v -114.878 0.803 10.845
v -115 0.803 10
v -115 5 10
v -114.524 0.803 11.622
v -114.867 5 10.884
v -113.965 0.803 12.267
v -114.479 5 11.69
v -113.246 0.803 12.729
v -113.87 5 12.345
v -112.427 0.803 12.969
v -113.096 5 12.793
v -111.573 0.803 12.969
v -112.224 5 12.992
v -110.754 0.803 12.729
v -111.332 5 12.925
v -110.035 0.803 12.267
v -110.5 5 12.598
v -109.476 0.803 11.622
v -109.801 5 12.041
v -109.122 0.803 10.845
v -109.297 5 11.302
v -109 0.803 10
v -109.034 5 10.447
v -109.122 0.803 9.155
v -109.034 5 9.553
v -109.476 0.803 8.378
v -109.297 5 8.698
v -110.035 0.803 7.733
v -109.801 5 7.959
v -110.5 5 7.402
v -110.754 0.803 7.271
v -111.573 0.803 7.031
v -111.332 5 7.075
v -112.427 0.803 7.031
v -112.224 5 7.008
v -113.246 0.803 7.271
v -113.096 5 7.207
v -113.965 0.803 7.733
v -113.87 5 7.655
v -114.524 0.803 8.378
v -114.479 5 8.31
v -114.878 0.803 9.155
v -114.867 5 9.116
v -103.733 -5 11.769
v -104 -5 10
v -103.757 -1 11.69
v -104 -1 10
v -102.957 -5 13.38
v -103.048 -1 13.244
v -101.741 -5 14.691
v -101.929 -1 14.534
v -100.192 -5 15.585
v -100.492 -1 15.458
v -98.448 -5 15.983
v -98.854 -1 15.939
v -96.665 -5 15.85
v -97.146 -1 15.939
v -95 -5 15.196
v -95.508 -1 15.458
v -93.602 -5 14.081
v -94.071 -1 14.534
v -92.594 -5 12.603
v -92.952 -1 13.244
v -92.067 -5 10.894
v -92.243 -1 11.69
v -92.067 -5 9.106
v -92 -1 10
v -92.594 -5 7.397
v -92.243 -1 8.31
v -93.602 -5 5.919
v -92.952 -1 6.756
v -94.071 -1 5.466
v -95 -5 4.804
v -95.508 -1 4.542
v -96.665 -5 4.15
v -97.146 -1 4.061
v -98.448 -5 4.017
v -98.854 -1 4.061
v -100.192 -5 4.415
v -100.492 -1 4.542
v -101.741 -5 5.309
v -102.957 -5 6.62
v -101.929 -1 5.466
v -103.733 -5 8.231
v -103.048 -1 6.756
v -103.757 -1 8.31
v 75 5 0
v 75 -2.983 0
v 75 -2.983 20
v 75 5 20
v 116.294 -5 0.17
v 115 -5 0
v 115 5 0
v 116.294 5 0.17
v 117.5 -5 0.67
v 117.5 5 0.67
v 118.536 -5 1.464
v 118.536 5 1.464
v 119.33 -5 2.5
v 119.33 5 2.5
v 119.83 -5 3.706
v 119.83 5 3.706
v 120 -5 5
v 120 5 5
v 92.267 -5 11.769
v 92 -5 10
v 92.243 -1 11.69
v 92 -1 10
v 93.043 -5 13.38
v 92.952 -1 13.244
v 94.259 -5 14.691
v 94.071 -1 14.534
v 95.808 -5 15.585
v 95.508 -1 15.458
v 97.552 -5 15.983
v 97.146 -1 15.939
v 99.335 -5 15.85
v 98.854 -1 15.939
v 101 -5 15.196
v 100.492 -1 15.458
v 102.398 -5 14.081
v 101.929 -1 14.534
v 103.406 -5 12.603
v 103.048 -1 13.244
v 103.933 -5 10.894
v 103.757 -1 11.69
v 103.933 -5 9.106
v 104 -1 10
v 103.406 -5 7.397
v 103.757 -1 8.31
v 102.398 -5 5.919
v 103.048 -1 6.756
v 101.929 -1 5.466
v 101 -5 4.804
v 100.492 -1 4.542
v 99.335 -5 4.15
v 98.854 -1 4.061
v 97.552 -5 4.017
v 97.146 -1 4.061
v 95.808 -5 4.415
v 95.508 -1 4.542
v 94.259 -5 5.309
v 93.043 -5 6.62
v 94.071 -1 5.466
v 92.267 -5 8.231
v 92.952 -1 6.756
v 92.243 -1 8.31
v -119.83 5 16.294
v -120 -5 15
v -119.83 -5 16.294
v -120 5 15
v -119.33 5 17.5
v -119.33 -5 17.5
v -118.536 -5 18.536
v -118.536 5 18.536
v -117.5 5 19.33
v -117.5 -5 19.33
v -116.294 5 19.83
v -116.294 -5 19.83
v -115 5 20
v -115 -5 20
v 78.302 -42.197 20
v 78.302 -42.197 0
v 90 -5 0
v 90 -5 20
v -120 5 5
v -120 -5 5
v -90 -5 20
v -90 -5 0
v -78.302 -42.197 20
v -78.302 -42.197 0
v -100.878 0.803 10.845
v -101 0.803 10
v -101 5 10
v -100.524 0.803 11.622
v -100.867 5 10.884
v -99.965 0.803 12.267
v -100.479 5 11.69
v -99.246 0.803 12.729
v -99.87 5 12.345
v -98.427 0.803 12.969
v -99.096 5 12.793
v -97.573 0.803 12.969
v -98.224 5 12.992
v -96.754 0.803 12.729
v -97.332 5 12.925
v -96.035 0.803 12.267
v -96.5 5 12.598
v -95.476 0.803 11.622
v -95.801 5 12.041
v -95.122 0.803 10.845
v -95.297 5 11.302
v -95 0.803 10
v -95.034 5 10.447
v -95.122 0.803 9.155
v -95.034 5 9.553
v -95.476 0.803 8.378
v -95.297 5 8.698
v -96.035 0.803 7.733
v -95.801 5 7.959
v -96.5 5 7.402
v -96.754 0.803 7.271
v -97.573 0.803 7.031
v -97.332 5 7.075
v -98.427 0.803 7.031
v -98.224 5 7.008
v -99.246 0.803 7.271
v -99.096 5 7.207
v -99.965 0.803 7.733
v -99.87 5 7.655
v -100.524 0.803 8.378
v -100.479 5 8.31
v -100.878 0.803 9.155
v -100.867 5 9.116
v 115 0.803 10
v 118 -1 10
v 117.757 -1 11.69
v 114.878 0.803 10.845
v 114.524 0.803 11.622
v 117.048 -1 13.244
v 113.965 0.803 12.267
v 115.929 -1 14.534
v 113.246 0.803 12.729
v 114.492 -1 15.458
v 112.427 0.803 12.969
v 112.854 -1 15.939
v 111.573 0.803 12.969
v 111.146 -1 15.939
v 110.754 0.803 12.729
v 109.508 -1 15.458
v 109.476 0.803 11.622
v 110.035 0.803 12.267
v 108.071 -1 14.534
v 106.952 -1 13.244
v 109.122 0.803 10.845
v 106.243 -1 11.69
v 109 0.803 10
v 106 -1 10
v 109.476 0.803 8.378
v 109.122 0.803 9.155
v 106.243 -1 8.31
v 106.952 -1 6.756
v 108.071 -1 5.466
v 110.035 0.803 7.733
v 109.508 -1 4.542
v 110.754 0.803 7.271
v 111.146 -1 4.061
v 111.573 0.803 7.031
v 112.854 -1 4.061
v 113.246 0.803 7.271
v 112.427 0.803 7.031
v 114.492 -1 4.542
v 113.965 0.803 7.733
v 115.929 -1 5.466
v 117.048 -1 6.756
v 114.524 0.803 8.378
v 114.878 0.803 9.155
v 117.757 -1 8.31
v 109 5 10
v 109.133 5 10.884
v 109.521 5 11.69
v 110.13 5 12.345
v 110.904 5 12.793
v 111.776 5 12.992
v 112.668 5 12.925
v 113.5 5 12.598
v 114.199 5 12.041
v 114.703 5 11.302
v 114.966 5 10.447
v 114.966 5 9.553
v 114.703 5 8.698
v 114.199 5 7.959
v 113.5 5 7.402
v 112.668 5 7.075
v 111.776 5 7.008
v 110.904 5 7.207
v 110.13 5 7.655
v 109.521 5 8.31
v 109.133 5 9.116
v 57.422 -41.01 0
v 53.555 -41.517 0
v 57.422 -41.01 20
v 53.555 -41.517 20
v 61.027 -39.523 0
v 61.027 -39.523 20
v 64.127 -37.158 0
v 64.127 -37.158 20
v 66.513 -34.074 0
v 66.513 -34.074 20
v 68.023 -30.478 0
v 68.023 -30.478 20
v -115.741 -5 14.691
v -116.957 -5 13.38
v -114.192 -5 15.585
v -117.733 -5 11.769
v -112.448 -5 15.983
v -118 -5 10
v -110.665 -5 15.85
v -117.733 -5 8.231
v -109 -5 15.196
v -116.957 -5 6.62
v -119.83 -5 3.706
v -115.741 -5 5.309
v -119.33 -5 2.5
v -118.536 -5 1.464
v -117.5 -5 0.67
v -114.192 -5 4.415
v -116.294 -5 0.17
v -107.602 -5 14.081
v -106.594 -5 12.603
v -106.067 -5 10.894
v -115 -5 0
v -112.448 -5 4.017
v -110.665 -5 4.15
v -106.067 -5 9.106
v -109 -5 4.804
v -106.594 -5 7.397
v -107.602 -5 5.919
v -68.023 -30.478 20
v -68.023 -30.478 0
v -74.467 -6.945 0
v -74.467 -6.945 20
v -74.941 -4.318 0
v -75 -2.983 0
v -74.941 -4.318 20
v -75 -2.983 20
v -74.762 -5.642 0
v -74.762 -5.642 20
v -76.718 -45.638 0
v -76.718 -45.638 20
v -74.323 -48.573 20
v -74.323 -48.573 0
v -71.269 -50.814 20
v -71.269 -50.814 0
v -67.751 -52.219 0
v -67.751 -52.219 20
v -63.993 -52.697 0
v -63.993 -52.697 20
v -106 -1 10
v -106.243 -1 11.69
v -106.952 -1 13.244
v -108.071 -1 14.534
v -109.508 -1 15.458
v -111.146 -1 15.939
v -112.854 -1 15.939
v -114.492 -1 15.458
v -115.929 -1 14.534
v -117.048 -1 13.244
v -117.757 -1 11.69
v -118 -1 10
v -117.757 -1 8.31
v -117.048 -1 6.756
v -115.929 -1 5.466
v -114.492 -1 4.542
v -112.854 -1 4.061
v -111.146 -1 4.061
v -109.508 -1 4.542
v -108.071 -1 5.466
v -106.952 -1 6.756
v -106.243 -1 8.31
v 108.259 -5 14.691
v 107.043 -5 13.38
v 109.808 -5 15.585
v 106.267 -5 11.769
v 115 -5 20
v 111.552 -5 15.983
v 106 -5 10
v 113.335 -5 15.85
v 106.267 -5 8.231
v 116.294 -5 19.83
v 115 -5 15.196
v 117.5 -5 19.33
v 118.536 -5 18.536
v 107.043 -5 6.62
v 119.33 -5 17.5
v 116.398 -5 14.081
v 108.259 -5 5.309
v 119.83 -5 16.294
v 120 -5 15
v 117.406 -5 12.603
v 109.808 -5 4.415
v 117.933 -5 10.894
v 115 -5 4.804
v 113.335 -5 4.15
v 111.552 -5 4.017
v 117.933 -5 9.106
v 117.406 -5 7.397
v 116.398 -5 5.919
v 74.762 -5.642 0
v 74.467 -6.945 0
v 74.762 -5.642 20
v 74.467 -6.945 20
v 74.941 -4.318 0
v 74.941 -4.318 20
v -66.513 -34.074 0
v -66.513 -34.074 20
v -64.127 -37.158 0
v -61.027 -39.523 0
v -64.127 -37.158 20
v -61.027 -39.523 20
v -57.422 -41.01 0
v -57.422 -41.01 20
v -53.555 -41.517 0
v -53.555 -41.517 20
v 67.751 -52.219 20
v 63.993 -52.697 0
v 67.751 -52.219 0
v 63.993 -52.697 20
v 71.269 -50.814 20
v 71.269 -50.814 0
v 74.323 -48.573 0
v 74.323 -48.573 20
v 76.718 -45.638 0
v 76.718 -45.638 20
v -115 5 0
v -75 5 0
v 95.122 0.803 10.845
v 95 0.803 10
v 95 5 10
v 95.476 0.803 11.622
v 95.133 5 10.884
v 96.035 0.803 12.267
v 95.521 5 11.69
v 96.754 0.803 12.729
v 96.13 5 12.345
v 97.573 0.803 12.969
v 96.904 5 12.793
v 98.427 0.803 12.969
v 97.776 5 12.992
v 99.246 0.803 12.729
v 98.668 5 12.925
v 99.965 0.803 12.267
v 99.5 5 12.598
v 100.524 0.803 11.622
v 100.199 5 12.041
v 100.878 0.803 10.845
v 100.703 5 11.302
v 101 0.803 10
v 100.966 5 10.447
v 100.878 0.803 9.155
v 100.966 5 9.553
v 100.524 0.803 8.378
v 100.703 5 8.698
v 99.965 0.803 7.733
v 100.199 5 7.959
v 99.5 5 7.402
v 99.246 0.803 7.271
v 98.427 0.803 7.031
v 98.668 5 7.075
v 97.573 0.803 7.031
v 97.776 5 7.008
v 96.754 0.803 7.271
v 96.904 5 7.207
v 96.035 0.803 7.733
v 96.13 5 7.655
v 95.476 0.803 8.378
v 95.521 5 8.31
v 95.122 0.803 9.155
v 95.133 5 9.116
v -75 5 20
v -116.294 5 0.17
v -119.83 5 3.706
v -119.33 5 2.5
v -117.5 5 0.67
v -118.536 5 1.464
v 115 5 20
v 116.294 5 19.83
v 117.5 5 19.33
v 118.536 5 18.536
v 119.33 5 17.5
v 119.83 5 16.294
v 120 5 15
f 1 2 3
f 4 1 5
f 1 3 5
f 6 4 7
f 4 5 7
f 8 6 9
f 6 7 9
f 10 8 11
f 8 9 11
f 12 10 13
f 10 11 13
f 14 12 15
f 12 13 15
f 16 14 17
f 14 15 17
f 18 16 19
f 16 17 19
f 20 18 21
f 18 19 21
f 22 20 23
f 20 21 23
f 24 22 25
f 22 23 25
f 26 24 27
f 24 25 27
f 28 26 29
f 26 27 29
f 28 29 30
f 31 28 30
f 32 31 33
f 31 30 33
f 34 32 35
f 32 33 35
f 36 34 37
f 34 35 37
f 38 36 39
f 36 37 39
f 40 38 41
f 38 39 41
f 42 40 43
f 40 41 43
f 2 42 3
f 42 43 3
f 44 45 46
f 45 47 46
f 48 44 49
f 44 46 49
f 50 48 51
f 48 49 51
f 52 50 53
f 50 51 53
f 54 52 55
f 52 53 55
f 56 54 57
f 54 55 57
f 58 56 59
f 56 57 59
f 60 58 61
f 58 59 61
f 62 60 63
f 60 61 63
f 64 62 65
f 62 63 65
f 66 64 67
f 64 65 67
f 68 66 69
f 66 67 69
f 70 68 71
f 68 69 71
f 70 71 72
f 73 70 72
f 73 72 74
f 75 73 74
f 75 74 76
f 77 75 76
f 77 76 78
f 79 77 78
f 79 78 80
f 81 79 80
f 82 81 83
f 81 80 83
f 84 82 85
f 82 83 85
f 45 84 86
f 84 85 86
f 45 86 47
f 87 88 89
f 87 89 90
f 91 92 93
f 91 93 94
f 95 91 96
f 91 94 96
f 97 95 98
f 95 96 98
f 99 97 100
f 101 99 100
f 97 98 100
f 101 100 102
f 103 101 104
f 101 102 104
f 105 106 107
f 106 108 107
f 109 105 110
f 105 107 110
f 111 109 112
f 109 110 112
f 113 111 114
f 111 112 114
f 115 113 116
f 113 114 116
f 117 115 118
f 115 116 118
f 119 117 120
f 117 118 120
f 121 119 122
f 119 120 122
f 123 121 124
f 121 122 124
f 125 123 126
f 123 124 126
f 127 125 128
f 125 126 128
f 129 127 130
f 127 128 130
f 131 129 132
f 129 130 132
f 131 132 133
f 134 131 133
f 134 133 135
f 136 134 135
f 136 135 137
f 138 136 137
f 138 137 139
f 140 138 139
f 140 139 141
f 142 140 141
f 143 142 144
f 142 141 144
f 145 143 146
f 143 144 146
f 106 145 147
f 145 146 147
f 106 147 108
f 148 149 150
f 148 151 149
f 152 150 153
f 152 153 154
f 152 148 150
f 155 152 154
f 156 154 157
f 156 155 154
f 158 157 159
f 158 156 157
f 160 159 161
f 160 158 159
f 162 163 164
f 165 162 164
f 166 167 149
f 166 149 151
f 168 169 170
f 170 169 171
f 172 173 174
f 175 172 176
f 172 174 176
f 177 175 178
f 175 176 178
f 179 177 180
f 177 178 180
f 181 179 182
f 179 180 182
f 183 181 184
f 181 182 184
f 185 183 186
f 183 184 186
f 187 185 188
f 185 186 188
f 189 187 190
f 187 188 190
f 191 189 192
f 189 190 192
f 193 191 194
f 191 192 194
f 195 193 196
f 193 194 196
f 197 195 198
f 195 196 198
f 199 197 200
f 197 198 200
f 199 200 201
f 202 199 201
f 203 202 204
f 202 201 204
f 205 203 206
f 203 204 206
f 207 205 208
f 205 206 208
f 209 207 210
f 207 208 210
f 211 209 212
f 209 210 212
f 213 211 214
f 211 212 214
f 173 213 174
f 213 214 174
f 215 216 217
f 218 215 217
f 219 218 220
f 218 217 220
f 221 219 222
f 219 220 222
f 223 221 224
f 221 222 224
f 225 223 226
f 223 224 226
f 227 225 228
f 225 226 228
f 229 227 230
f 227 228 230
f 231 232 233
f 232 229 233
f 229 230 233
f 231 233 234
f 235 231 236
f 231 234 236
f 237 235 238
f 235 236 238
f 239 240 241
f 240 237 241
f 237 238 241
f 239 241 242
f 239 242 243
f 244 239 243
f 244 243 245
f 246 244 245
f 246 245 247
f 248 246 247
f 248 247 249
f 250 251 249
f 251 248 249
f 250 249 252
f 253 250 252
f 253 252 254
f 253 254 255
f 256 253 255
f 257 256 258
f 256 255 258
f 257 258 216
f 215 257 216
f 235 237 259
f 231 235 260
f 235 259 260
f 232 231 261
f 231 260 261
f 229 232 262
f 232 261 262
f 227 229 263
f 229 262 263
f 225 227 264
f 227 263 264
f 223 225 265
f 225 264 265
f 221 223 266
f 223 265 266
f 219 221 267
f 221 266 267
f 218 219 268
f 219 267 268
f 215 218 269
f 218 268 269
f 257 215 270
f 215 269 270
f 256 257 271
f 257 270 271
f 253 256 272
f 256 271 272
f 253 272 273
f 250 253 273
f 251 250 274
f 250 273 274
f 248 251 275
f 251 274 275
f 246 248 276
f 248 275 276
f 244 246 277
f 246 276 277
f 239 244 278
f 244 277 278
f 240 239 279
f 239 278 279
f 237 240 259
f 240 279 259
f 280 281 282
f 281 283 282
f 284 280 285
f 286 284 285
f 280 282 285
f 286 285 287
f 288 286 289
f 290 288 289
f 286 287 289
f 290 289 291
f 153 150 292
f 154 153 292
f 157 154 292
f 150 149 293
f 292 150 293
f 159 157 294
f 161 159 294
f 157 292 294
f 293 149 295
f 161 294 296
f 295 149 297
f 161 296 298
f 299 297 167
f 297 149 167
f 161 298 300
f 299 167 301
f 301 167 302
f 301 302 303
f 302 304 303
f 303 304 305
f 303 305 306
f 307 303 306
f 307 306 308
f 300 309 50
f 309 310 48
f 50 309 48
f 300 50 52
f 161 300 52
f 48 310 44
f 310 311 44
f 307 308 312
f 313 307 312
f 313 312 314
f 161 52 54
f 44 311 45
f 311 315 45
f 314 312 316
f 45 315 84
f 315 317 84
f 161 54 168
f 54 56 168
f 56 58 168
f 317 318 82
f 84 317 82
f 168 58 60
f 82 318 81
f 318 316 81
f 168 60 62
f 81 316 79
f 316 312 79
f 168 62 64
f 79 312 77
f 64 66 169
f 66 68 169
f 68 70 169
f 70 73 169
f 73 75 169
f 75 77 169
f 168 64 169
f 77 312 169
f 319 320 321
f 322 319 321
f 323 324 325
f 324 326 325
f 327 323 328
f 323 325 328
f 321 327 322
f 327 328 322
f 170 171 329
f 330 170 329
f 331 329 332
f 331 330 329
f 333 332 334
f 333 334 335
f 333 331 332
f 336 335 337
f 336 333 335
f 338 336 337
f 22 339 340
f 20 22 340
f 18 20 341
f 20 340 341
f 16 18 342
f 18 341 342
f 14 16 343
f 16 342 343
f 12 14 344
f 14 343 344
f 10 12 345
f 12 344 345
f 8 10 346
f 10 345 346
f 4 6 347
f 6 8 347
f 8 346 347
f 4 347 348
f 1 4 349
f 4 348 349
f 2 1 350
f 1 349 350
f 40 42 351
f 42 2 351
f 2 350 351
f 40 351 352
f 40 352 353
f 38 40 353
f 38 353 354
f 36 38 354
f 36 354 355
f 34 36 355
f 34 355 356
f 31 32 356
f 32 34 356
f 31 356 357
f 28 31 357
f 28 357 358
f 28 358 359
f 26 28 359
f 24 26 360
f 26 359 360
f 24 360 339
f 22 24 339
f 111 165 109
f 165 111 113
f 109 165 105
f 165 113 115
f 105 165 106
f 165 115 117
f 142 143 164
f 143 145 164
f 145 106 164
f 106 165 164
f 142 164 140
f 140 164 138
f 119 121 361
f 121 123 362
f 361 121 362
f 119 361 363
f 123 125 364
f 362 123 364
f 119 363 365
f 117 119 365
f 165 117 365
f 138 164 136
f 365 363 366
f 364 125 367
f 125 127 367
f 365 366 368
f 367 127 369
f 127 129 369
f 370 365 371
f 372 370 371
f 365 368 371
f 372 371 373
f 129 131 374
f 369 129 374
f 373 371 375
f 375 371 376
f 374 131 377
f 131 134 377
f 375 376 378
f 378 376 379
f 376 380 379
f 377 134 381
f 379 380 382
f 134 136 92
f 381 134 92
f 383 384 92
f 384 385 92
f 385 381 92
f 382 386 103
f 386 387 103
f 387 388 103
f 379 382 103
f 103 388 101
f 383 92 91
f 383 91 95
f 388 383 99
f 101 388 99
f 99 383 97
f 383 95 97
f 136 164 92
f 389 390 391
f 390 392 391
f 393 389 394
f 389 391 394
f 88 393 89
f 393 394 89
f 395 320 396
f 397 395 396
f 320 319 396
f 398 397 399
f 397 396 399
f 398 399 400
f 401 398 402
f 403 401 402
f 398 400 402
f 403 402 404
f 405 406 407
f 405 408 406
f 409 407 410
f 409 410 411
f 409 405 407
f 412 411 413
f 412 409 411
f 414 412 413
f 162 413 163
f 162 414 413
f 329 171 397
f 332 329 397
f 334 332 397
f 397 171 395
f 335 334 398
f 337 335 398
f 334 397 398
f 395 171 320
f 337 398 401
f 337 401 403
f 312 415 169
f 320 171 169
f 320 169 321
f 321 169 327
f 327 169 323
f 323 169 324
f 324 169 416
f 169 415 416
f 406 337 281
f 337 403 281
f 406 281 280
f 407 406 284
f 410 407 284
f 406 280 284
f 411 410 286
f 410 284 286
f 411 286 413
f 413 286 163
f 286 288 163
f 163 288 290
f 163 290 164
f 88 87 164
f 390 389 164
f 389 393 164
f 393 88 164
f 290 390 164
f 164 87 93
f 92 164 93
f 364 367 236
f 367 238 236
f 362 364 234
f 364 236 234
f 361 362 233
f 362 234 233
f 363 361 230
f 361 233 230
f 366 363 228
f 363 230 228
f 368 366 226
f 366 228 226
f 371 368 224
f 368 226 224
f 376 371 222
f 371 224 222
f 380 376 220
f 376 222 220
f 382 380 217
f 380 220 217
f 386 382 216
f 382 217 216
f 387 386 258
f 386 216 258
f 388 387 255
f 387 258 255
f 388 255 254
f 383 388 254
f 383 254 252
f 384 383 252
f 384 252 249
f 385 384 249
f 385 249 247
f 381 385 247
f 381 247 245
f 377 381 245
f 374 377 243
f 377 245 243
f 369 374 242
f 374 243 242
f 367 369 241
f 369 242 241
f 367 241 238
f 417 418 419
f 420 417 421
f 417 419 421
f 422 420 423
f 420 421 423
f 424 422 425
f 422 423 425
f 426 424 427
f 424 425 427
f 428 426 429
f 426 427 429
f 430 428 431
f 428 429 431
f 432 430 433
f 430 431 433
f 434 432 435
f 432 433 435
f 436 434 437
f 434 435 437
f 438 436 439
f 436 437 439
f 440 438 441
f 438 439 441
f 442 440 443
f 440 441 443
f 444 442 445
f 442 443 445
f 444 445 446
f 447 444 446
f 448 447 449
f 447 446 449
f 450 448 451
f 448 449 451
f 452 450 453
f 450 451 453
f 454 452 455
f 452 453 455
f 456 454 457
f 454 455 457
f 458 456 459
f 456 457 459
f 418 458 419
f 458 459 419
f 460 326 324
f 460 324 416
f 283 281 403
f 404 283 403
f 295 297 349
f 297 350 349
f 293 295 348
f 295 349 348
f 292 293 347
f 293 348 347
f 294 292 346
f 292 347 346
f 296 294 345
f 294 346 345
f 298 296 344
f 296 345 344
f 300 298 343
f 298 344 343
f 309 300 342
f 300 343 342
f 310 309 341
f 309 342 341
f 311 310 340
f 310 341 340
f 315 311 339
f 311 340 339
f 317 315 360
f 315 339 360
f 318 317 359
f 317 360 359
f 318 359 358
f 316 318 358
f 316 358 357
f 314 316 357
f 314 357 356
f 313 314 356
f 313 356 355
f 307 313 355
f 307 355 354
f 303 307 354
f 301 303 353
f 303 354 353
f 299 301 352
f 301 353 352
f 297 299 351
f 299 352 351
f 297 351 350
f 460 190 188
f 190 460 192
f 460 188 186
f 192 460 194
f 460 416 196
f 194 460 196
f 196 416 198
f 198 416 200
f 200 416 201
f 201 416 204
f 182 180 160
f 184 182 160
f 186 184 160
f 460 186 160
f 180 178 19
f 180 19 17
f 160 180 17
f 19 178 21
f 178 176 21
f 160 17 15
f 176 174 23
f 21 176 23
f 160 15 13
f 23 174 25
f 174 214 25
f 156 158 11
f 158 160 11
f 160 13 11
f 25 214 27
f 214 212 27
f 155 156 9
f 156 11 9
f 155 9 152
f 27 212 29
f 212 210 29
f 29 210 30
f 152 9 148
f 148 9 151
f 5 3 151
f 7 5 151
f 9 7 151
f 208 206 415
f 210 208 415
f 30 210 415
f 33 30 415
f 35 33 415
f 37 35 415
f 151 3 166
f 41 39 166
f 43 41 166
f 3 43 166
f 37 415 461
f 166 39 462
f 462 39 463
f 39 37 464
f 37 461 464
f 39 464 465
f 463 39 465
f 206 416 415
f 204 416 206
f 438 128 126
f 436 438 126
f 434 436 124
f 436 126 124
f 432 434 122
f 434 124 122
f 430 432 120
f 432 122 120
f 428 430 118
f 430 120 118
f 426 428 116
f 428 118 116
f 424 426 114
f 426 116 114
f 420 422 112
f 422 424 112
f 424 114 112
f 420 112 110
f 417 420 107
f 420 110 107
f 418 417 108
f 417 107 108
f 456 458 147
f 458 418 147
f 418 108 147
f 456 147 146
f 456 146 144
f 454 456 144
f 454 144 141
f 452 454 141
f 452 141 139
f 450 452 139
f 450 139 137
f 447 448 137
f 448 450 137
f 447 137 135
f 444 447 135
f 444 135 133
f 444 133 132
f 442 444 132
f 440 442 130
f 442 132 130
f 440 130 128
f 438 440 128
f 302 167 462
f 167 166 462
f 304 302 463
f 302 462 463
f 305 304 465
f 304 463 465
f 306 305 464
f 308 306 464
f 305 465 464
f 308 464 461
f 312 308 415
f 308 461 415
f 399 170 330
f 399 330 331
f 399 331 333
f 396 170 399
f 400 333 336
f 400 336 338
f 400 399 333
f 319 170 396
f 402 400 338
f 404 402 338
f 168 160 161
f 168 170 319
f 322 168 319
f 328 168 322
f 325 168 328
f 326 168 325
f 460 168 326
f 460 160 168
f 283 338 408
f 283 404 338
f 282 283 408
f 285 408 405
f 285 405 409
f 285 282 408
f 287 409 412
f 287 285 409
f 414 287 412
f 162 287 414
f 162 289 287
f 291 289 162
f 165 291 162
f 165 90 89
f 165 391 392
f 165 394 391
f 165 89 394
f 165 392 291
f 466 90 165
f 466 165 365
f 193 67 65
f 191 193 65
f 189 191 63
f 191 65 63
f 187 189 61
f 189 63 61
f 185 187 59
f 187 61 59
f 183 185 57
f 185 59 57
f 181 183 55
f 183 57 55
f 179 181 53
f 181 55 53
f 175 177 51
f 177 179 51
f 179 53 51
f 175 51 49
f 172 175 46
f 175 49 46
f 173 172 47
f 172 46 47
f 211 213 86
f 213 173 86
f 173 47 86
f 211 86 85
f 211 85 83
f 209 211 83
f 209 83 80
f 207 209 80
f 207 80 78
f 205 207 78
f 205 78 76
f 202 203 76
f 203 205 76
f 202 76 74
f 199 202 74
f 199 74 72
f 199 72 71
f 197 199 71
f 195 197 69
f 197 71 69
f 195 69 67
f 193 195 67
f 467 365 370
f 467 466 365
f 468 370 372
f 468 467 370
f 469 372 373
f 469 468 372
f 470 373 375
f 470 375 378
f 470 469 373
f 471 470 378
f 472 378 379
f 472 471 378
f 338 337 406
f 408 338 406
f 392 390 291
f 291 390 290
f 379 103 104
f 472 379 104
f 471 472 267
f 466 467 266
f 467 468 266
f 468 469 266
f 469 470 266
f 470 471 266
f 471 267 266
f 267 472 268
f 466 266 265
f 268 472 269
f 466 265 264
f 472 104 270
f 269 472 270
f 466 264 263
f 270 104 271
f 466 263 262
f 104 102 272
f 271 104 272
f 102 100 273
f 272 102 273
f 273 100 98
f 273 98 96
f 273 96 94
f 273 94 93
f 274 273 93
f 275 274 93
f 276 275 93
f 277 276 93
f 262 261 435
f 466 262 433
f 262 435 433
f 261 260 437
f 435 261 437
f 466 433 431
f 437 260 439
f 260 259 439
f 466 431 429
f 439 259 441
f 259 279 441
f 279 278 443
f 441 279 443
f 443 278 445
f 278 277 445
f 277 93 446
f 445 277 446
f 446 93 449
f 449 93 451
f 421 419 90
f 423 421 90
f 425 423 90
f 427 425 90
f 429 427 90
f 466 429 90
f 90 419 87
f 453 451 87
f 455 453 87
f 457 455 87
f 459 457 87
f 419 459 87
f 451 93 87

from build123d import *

# Parameters (mm, degrees)
F0_W     = 30
F0_H     = 10
F0_W_2   = 15
F1_DEPTH = 20
F3_D     = 6
F4_D     = 12
F4_DEPTH = 4
F4_TIP   = 3.6051637142
F5_R     = 5
F6_R     = 15


with BuildPart() as f1:
    # F0 (on Top) → F1 (new body)
    with BuildSketch(Plane.XY):
        with Locations((-105, 0)):
            Rectangle(F0_W, F0_H)
        with Locations((-82.5, 0)):
            Rectangle(F0_W_2, F0_H)
        Polygon((-75, -5), (-90, -5), (-75, -52.6969600708), (75, -52.6969600708), (90, -5), (75, -5), (65, -41.5166201833), (-65, -41.5166201833), align=None)
        with Locations((82.5, 0)):
            Rectangle(F0_W_2, F0_H)
        with Locations((105, 0)):
            Rectangle(F0_W, F0_H)
    extrude(amount=F1_DEPTH)

    # F3 (through all)
    with Locations(Plane.XZ.offset(5)):
        with Locations((-112, 10), (-98, 10), (98, 10), (112, 10)):
            Hole(F3_D / 2)

    # F4
    with Locations(Plane.XZ.offset(5)):
        with Locations((-112, 10), (-98, 10), (98, 10), (112, 10)):
            Hole(F4_D / 2, depth=F4_DEPTH)
            with Locations((0, 0, -(F4_DEPTH + F4_TIP / 2))):  # 118° drill point
                Cone(0, F4_D / 2, F4_TIP, mode=Mode.SUBTRACT)

    # F5
    f5_edges = [f1.edges().sort_by_distance(p)[0] for p in [
        (-120, 0, 20),
        (-120, 0, 0),
        (120, 0, 20),
        (120, 0, 0),
    ]]
    fillet(f5_edges, radius=F5_R)

    # F6
    f6_edges = [f1.edges().sort_by_distance(p)[0] for p in [
        (-75, -52.69696, 10),
        (75, -52.69696, 10),
        (-65, -41.51662, 10),
        (65, -41.51662, 10),
        (-75, -5, 10),
        (75, -5, 10),
    ]]
    fillet(f6_edges, radius=F6_R)


solid = f1.part
